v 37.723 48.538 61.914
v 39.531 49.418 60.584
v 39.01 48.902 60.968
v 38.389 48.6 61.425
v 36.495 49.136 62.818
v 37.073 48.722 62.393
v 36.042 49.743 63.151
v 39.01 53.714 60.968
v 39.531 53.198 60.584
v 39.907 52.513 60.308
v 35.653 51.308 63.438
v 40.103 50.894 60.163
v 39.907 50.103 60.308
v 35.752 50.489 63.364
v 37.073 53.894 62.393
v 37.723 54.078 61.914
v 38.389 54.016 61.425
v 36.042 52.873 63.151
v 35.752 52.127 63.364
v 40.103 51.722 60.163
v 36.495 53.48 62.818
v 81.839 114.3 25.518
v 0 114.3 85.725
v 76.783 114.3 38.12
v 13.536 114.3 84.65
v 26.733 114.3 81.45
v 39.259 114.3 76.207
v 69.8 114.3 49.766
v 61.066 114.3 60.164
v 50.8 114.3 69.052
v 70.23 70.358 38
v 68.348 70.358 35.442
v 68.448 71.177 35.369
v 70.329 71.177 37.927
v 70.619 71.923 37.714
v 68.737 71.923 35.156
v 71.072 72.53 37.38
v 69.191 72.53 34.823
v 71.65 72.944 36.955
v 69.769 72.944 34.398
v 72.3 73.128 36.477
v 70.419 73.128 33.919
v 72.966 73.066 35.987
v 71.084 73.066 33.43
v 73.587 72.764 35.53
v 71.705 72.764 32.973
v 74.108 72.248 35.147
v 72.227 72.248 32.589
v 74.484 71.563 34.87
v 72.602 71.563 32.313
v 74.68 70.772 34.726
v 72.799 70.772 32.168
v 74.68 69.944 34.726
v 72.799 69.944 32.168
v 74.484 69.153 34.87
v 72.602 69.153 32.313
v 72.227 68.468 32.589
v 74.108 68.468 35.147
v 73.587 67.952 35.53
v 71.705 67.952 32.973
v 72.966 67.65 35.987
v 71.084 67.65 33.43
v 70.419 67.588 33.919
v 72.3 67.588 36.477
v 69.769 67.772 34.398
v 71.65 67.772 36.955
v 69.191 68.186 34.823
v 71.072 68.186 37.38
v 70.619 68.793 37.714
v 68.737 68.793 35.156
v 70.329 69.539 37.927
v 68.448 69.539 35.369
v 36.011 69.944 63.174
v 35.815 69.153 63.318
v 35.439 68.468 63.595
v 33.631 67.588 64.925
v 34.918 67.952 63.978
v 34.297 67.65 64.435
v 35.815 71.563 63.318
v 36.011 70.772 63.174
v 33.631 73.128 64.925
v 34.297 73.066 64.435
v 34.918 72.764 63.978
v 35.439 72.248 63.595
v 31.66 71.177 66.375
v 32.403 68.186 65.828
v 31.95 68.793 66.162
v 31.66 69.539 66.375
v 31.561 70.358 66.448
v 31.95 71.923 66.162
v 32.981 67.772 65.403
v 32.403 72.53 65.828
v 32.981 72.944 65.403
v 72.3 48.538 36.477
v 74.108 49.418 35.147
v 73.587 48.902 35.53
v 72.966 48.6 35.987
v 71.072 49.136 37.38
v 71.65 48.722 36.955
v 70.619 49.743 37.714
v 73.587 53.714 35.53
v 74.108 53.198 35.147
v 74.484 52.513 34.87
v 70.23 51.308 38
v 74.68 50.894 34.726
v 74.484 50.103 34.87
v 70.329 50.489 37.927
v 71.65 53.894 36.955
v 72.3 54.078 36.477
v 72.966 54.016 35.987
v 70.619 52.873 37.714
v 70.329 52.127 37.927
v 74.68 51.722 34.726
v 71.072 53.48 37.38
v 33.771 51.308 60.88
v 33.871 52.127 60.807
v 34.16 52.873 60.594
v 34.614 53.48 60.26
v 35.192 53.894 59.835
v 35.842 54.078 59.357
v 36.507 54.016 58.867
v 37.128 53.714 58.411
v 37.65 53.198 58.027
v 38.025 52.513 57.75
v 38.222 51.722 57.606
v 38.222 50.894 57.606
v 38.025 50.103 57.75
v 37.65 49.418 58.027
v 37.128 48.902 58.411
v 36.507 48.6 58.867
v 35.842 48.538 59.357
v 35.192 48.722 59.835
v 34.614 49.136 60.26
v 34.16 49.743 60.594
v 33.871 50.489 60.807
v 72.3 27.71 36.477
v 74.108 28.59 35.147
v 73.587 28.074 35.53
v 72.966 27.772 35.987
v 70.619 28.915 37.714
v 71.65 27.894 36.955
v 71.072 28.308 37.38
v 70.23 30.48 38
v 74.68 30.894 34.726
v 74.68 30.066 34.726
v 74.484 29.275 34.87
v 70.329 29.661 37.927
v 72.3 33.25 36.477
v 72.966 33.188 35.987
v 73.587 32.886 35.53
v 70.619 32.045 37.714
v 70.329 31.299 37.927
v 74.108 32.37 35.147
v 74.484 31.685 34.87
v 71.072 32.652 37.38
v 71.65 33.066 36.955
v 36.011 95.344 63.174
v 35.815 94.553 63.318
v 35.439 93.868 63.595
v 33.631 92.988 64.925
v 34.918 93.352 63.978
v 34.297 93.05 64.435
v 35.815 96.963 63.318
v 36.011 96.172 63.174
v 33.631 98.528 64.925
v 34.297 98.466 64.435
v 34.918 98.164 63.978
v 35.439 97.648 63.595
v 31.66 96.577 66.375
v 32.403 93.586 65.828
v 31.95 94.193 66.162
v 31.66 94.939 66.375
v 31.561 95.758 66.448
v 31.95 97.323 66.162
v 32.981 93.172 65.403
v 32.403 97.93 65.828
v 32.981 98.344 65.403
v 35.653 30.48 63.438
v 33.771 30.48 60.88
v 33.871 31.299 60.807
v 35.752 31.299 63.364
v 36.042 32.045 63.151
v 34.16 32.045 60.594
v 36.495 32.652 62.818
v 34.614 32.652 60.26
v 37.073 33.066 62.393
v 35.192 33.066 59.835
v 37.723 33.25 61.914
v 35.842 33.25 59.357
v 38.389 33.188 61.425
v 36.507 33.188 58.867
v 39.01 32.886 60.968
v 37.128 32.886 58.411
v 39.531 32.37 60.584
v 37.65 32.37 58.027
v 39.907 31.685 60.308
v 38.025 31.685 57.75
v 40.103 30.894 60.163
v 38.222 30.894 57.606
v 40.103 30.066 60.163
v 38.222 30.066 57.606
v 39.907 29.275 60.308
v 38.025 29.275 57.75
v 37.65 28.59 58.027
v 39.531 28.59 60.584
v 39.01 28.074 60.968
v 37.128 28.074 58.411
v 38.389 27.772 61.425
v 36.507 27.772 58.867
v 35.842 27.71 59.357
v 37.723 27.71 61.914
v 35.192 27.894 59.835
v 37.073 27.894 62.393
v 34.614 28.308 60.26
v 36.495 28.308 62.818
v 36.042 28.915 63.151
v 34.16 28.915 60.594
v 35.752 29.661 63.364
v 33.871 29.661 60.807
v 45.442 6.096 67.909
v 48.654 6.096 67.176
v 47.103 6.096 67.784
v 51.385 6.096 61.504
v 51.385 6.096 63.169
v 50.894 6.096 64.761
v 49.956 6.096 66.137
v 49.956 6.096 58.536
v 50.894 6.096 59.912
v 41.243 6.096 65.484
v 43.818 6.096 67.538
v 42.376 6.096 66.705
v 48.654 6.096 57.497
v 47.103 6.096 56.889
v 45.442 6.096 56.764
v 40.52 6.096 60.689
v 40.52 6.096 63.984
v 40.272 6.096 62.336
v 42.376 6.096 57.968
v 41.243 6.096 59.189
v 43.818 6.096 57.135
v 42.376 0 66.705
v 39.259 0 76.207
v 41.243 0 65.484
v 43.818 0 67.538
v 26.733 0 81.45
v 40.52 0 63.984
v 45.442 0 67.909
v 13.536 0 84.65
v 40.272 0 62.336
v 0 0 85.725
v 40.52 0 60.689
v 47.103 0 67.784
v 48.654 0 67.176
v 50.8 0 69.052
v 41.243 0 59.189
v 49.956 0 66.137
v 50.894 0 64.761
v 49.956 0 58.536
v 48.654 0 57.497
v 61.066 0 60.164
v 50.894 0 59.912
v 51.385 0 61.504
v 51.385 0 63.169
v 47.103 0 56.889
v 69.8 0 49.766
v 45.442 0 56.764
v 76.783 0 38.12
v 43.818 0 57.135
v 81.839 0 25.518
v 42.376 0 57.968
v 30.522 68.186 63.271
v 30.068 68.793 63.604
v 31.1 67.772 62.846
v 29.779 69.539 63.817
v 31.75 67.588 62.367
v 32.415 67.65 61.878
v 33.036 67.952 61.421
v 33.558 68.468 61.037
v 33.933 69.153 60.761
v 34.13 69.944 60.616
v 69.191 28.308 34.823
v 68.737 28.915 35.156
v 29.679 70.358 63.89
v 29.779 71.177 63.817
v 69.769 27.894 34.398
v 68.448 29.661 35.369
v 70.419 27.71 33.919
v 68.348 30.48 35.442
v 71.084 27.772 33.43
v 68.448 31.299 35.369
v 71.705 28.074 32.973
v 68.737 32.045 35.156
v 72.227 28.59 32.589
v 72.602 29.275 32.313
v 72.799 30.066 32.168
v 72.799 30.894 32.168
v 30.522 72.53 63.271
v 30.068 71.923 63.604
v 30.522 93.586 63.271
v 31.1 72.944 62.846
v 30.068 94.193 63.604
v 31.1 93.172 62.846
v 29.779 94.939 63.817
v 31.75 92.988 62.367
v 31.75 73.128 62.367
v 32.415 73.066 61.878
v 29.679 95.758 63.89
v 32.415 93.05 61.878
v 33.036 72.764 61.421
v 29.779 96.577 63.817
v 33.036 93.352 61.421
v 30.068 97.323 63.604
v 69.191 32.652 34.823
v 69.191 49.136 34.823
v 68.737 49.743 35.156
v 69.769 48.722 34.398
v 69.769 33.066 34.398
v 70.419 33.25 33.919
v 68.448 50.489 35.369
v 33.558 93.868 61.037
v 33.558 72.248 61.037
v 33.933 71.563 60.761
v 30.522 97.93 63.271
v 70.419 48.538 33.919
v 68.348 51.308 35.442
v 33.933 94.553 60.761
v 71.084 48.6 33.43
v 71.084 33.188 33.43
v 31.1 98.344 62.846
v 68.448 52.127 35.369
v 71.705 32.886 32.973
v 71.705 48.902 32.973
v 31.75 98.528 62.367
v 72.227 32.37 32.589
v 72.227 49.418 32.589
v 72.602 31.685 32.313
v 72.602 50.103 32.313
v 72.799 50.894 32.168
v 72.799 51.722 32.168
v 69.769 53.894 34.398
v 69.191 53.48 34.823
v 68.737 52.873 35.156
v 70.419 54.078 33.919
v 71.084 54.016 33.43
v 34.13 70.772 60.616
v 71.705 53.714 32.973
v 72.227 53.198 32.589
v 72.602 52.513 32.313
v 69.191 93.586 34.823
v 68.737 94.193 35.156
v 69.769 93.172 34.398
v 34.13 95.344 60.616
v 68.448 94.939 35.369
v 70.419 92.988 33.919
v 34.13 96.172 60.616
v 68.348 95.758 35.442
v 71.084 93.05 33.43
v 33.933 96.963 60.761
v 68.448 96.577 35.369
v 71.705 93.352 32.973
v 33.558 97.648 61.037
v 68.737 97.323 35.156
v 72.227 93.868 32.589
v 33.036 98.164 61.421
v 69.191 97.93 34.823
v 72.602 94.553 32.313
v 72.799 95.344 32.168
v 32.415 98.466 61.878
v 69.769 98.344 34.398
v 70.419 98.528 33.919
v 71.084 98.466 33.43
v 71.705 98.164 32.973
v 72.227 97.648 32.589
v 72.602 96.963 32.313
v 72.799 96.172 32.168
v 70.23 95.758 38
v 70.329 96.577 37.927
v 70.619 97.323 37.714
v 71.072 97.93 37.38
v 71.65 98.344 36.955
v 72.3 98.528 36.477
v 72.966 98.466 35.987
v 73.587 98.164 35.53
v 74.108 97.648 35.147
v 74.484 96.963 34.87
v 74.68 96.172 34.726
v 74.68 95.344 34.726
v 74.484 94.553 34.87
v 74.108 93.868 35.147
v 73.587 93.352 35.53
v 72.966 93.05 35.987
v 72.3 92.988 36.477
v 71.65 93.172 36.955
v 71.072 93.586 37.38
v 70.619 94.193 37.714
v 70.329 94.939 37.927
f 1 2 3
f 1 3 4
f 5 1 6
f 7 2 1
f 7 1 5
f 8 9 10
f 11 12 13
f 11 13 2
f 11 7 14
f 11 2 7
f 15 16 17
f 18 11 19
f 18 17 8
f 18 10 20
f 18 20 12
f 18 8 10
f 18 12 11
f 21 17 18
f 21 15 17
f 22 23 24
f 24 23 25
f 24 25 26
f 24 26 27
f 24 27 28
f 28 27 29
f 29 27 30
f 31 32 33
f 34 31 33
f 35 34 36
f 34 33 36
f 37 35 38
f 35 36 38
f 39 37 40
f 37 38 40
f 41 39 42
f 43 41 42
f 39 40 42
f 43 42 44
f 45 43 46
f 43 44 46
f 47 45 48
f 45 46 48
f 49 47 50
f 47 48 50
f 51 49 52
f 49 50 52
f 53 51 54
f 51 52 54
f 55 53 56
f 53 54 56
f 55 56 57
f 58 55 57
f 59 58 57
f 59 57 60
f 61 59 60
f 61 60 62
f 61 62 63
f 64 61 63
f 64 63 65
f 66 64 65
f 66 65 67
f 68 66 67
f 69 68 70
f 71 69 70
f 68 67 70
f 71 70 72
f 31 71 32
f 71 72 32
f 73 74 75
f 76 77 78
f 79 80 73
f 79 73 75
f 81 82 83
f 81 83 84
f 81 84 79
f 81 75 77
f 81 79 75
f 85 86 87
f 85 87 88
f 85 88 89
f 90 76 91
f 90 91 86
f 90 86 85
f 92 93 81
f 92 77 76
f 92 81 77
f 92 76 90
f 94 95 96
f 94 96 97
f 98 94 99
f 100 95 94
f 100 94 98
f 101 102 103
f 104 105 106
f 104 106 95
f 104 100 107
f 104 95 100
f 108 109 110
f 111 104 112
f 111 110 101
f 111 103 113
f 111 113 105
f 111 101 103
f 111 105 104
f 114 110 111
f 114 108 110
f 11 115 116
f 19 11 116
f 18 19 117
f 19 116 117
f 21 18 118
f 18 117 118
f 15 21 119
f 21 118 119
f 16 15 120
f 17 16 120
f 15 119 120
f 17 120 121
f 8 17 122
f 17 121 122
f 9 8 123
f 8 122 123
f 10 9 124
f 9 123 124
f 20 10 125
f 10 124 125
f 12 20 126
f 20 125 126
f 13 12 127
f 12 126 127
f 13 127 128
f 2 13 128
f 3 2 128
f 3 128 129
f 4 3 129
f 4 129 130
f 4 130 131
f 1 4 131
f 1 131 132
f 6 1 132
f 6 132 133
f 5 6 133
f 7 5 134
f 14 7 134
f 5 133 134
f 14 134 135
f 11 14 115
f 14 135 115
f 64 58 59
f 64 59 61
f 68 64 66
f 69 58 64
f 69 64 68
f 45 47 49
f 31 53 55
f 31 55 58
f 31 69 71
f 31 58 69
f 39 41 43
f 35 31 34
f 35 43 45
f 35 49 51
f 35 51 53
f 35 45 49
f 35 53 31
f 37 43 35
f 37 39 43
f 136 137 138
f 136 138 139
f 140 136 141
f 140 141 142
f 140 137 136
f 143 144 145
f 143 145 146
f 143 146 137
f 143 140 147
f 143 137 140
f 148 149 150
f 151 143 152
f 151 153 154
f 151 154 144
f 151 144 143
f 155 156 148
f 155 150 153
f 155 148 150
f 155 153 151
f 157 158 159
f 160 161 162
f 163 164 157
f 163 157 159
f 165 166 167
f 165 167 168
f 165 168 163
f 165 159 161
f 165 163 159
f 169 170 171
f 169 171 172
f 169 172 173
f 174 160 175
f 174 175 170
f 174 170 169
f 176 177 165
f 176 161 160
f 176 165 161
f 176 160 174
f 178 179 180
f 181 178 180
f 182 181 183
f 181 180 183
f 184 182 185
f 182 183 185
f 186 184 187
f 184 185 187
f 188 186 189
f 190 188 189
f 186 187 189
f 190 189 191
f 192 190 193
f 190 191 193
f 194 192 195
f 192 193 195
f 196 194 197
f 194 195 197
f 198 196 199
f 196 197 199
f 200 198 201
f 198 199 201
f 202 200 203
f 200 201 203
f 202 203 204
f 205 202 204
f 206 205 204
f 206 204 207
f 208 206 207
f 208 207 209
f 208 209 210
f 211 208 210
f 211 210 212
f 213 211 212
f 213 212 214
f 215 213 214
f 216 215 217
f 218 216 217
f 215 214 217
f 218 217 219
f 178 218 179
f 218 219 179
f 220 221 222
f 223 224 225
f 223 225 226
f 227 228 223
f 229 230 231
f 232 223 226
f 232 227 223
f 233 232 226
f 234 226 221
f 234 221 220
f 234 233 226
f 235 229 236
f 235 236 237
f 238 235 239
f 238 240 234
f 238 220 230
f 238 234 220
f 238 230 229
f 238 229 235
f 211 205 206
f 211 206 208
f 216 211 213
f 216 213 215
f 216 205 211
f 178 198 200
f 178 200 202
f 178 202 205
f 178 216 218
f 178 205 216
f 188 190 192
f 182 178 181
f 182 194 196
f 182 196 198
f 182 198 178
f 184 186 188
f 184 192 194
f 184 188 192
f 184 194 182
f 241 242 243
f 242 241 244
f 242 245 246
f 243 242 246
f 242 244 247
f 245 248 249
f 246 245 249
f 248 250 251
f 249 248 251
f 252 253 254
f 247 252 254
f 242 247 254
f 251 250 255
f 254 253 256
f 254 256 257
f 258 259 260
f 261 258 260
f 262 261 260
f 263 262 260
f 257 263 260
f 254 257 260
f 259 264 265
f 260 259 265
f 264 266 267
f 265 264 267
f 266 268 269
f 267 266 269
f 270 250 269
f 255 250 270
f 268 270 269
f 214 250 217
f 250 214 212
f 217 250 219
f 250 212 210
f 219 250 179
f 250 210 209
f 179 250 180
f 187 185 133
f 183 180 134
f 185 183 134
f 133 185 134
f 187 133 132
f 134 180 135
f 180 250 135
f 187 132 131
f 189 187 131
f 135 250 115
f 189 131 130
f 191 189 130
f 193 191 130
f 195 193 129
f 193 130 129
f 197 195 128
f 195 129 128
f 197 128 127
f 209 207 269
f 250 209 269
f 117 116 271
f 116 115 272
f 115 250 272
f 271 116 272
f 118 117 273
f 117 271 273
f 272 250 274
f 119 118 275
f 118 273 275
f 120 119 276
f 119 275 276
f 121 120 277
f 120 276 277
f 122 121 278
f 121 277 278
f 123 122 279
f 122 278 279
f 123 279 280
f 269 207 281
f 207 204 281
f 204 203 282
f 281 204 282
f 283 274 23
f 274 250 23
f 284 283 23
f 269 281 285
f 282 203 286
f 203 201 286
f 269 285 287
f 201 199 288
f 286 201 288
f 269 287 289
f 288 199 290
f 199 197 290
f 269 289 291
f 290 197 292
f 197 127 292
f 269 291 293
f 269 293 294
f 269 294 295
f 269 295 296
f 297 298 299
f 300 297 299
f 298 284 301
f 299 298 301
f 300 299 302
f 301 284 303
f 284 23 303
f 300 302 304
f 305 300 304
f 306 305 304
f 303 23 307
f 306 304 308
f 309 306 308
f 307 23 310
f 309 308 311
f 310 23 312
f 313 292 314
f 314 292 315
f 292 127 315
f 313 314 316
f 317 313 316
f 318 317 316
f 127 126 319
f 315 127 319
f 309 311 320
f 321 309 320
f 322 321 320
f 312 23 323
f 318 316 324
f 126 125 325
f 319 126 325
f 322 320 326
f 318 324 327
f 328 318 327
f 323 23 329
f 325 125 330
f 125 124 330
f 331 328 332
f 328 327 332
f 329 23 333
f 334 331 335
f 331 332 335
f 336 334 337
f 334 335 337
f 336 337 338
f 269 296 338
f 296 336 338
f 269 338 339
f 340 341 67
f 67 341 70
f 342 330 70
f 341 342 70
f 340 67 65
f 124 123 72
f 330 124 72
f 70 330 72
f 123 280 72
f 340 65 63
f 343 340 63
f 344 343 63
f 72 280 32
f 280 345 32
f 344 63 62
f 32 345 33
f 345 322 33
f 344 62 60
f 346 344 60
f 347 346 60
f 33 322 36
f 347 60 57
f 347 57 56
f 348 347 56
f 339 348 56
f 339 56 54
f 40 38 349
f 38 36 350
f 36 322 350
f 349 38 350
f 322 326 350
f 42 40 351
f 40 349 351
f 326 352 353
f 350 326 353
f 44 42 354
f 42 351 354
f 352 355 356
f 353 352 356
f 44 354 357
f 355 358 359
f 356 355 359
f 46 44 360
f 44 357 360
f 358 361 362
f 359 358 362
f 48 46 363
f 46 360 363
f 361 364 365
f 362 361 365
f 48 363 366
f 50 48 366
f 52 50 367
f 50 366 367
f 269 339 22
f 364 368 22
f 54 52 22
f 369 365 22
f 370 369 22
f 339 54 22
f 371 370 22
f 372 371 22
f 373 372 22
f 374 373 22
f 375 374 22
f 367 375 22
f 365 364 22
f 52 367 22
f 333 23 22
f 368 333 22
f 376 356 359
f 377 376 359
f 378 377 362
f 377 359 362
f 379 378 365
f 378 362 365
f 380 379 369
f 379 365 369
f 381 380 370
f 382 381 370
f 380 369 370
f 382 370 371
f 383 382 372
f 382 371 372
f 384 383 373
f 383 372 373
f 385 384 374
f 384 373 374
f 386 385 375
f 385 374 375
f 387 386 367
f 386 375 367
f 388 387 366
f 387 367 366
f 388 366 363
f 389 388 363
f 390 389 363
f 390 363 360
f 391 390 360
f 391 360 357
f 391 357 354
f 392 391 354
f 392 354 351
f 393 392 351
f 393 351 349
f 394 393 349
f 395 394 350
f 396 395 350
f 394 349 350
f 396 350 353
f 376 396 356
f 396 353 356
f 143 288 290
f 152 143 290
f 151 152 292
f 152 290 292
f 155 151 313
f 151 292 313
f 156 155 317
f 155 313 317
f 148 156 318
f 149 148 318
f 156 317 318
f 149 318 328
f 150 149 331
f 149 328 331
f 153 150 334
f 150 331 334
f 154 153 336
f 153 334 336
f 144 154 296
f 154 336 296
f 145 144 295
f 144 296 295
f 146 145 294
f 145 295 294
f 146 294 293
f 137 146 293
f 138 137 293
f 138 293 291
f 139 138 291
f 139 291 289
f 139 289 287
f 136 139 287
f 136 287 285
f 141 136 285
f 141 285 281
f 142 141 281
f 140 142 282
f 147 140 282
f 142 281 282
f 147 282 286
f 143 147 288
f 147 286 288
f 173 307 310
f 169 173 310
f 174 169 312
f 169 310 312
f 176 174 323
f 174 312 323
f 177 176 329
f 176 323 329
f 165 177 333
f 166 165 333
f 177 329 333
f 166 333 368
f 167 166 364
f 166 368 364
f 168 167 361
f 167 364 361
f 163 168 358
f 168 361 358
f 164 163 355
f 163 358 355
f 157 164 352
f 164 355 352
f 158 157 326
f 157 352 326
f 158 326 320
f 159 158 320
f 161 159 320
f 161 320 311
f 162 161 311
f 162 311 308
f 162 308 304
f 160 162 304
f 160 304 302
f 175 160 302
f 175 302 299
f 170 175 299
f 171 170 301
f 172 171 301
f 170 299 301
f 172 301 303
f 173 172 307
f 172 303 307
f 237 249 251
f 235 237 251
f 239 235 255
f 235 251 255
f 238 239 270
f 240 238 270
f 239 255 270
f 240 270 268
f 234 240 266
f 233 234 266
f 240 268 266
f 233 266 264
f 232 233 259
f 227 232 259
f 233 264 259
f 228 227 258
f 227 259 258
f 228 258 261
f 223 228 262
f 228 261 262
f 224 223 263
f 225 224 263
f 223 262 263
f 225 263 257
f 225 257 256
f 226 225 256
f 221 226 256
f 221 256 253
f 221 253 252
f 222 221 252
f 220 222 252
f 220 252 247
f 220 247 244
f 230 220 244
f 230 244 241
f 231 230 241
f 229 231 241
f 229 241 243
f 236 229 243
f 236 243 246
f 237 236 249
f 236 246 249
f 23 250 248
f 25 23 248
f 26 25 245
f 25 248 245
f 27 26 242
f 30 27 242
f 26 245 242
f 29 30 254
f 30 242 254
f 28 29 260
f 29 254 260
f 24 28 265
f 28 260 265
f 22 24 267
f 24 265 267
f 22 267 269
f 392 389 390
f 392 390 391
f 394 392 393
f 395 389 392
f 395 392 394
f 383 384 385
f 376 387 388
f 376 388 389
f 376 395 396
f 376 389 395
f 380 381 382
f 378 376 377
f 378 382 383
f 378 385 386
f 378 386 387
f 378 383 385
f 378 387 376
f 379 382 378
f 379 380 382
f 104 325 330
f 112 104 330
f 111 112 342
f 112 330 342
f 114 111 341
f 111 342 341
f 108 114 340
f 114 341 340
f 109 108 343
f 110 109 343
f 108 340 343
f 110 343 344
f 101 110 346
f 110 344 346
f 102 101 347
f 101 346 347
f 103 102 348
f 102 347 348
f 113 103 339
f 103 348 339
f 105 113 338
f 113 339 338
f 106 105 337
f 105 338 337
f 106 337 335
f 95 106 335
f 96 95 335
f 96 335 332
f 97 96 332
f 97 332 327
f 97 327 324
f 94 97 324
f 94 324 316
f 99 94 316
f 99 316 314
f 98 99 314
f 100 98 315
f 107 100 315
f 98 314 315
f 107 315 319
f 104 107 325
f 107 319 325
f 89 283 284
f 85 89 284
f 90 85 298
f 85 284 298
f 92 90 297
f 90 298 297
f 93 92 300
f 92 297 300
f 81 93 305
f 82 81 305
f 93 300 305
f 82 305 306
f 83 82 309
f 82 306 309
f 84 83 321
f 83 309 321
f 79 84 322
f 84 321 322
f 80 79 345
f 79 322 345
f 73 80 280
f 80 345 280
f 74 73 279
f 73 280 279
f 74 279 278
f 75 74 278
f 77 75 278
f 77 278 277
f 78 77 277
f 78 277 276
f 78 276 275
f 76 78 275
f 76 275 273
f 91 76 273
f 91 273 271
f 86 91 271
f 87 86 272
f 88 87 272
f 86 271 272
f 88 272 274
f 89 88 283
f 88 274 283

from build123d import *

# Parameters (mm, degrees)
SKETCH1_R           = 85.725
BOSS_EXTRUDE1_DEPTH = 114.3
CUT_EXTRUDE1_DEPTH  = 152.4
SKETCH3_R           = 2.778125
CUT_EXTRUDE2_DEPTH  = 3.175
SKETCH4_R           = 5.588
CUT_EXTRUDE3_DEPTH  = 6.096


with BuildPart() as part:
    # Sketch1 → Boss-Extrude1 (new body)
    with BuildSketch(Plane(origin=(0, 0, 0), x_dir=(1, 0, 0), z_dir=(0, 1, 0))):
        Circle(SKETCH1_R)
    extrude(amount=BOSS_EXTRUDE1_DEPTH)

    # Sketch2 → Cut-Extrude1 (cut)
    with BuildSketch(Plane(origin=(0, 114.3, 0), x_dir=(1, 0, 0), z_dir=(0, 1, 0))):
        Polygon((0, -85.725), (81.83903771, -25.517592593), (151.304734273, 75.062868172), (-38.51393236, 115.934796391), (-149.339737724, 18.86396687), (-68.774879215, -104.537816407), align=None)
    extrude(amount=-CUT_EXTRUDE1_DEPTH, mode=Mode.SUBTRACT)

    # Sketch3 → Cut-Extrude2 (cut)
    with BuildSketch(Plane(origin=(40.919518855, 0, 55.621296296), x_dir=(-0.80550234, 0, 0.592592593), z_dir=(-0.592592593, 0, -0.80550234))):
        with Locations((-36.83, 95.758)):
            Circle(SKETCH3_R)
        with Locations((11.176, 95.758)):
            Circle(SKETCH3_R)
        with Locations((-36.83, 70.358)):
            Circle(SKETCH3_R)
        with Locations((11.176, 70.358)):
            Circle(SKETCH3_R)
        with Locations((-36.83, 51.308)):
            Circle(SKETCH3_R)
        with Locations((6.096, 51.308)):
            Circle(SKETCH3_R)
        with Locations((-36.83, 30.48)):
            Circle(SKETCH3_R)
        with Locations((6.096, 30.48)):
            Circle(SKETCH3_R)
    extrude(amount=-CUT_EXTRUDE2_DEPTH, mode=Mode.SUBTRACT)

    # Sketch4 → Cut-Extrude3 (cut)
    with BuildSketch(Plane(origin=(0, 0, 0), x_dir=(-1, 0, 0), z_dir=(0, -1, 0))):
        with Locations((-45.859759427, -62.336492182)):
            Circle(SKETCH4_R)
    extrude(amount=-CUT_EXTRUDE3_DEPTH, mode=Mode.SUBTRACT)


solid = part.part
